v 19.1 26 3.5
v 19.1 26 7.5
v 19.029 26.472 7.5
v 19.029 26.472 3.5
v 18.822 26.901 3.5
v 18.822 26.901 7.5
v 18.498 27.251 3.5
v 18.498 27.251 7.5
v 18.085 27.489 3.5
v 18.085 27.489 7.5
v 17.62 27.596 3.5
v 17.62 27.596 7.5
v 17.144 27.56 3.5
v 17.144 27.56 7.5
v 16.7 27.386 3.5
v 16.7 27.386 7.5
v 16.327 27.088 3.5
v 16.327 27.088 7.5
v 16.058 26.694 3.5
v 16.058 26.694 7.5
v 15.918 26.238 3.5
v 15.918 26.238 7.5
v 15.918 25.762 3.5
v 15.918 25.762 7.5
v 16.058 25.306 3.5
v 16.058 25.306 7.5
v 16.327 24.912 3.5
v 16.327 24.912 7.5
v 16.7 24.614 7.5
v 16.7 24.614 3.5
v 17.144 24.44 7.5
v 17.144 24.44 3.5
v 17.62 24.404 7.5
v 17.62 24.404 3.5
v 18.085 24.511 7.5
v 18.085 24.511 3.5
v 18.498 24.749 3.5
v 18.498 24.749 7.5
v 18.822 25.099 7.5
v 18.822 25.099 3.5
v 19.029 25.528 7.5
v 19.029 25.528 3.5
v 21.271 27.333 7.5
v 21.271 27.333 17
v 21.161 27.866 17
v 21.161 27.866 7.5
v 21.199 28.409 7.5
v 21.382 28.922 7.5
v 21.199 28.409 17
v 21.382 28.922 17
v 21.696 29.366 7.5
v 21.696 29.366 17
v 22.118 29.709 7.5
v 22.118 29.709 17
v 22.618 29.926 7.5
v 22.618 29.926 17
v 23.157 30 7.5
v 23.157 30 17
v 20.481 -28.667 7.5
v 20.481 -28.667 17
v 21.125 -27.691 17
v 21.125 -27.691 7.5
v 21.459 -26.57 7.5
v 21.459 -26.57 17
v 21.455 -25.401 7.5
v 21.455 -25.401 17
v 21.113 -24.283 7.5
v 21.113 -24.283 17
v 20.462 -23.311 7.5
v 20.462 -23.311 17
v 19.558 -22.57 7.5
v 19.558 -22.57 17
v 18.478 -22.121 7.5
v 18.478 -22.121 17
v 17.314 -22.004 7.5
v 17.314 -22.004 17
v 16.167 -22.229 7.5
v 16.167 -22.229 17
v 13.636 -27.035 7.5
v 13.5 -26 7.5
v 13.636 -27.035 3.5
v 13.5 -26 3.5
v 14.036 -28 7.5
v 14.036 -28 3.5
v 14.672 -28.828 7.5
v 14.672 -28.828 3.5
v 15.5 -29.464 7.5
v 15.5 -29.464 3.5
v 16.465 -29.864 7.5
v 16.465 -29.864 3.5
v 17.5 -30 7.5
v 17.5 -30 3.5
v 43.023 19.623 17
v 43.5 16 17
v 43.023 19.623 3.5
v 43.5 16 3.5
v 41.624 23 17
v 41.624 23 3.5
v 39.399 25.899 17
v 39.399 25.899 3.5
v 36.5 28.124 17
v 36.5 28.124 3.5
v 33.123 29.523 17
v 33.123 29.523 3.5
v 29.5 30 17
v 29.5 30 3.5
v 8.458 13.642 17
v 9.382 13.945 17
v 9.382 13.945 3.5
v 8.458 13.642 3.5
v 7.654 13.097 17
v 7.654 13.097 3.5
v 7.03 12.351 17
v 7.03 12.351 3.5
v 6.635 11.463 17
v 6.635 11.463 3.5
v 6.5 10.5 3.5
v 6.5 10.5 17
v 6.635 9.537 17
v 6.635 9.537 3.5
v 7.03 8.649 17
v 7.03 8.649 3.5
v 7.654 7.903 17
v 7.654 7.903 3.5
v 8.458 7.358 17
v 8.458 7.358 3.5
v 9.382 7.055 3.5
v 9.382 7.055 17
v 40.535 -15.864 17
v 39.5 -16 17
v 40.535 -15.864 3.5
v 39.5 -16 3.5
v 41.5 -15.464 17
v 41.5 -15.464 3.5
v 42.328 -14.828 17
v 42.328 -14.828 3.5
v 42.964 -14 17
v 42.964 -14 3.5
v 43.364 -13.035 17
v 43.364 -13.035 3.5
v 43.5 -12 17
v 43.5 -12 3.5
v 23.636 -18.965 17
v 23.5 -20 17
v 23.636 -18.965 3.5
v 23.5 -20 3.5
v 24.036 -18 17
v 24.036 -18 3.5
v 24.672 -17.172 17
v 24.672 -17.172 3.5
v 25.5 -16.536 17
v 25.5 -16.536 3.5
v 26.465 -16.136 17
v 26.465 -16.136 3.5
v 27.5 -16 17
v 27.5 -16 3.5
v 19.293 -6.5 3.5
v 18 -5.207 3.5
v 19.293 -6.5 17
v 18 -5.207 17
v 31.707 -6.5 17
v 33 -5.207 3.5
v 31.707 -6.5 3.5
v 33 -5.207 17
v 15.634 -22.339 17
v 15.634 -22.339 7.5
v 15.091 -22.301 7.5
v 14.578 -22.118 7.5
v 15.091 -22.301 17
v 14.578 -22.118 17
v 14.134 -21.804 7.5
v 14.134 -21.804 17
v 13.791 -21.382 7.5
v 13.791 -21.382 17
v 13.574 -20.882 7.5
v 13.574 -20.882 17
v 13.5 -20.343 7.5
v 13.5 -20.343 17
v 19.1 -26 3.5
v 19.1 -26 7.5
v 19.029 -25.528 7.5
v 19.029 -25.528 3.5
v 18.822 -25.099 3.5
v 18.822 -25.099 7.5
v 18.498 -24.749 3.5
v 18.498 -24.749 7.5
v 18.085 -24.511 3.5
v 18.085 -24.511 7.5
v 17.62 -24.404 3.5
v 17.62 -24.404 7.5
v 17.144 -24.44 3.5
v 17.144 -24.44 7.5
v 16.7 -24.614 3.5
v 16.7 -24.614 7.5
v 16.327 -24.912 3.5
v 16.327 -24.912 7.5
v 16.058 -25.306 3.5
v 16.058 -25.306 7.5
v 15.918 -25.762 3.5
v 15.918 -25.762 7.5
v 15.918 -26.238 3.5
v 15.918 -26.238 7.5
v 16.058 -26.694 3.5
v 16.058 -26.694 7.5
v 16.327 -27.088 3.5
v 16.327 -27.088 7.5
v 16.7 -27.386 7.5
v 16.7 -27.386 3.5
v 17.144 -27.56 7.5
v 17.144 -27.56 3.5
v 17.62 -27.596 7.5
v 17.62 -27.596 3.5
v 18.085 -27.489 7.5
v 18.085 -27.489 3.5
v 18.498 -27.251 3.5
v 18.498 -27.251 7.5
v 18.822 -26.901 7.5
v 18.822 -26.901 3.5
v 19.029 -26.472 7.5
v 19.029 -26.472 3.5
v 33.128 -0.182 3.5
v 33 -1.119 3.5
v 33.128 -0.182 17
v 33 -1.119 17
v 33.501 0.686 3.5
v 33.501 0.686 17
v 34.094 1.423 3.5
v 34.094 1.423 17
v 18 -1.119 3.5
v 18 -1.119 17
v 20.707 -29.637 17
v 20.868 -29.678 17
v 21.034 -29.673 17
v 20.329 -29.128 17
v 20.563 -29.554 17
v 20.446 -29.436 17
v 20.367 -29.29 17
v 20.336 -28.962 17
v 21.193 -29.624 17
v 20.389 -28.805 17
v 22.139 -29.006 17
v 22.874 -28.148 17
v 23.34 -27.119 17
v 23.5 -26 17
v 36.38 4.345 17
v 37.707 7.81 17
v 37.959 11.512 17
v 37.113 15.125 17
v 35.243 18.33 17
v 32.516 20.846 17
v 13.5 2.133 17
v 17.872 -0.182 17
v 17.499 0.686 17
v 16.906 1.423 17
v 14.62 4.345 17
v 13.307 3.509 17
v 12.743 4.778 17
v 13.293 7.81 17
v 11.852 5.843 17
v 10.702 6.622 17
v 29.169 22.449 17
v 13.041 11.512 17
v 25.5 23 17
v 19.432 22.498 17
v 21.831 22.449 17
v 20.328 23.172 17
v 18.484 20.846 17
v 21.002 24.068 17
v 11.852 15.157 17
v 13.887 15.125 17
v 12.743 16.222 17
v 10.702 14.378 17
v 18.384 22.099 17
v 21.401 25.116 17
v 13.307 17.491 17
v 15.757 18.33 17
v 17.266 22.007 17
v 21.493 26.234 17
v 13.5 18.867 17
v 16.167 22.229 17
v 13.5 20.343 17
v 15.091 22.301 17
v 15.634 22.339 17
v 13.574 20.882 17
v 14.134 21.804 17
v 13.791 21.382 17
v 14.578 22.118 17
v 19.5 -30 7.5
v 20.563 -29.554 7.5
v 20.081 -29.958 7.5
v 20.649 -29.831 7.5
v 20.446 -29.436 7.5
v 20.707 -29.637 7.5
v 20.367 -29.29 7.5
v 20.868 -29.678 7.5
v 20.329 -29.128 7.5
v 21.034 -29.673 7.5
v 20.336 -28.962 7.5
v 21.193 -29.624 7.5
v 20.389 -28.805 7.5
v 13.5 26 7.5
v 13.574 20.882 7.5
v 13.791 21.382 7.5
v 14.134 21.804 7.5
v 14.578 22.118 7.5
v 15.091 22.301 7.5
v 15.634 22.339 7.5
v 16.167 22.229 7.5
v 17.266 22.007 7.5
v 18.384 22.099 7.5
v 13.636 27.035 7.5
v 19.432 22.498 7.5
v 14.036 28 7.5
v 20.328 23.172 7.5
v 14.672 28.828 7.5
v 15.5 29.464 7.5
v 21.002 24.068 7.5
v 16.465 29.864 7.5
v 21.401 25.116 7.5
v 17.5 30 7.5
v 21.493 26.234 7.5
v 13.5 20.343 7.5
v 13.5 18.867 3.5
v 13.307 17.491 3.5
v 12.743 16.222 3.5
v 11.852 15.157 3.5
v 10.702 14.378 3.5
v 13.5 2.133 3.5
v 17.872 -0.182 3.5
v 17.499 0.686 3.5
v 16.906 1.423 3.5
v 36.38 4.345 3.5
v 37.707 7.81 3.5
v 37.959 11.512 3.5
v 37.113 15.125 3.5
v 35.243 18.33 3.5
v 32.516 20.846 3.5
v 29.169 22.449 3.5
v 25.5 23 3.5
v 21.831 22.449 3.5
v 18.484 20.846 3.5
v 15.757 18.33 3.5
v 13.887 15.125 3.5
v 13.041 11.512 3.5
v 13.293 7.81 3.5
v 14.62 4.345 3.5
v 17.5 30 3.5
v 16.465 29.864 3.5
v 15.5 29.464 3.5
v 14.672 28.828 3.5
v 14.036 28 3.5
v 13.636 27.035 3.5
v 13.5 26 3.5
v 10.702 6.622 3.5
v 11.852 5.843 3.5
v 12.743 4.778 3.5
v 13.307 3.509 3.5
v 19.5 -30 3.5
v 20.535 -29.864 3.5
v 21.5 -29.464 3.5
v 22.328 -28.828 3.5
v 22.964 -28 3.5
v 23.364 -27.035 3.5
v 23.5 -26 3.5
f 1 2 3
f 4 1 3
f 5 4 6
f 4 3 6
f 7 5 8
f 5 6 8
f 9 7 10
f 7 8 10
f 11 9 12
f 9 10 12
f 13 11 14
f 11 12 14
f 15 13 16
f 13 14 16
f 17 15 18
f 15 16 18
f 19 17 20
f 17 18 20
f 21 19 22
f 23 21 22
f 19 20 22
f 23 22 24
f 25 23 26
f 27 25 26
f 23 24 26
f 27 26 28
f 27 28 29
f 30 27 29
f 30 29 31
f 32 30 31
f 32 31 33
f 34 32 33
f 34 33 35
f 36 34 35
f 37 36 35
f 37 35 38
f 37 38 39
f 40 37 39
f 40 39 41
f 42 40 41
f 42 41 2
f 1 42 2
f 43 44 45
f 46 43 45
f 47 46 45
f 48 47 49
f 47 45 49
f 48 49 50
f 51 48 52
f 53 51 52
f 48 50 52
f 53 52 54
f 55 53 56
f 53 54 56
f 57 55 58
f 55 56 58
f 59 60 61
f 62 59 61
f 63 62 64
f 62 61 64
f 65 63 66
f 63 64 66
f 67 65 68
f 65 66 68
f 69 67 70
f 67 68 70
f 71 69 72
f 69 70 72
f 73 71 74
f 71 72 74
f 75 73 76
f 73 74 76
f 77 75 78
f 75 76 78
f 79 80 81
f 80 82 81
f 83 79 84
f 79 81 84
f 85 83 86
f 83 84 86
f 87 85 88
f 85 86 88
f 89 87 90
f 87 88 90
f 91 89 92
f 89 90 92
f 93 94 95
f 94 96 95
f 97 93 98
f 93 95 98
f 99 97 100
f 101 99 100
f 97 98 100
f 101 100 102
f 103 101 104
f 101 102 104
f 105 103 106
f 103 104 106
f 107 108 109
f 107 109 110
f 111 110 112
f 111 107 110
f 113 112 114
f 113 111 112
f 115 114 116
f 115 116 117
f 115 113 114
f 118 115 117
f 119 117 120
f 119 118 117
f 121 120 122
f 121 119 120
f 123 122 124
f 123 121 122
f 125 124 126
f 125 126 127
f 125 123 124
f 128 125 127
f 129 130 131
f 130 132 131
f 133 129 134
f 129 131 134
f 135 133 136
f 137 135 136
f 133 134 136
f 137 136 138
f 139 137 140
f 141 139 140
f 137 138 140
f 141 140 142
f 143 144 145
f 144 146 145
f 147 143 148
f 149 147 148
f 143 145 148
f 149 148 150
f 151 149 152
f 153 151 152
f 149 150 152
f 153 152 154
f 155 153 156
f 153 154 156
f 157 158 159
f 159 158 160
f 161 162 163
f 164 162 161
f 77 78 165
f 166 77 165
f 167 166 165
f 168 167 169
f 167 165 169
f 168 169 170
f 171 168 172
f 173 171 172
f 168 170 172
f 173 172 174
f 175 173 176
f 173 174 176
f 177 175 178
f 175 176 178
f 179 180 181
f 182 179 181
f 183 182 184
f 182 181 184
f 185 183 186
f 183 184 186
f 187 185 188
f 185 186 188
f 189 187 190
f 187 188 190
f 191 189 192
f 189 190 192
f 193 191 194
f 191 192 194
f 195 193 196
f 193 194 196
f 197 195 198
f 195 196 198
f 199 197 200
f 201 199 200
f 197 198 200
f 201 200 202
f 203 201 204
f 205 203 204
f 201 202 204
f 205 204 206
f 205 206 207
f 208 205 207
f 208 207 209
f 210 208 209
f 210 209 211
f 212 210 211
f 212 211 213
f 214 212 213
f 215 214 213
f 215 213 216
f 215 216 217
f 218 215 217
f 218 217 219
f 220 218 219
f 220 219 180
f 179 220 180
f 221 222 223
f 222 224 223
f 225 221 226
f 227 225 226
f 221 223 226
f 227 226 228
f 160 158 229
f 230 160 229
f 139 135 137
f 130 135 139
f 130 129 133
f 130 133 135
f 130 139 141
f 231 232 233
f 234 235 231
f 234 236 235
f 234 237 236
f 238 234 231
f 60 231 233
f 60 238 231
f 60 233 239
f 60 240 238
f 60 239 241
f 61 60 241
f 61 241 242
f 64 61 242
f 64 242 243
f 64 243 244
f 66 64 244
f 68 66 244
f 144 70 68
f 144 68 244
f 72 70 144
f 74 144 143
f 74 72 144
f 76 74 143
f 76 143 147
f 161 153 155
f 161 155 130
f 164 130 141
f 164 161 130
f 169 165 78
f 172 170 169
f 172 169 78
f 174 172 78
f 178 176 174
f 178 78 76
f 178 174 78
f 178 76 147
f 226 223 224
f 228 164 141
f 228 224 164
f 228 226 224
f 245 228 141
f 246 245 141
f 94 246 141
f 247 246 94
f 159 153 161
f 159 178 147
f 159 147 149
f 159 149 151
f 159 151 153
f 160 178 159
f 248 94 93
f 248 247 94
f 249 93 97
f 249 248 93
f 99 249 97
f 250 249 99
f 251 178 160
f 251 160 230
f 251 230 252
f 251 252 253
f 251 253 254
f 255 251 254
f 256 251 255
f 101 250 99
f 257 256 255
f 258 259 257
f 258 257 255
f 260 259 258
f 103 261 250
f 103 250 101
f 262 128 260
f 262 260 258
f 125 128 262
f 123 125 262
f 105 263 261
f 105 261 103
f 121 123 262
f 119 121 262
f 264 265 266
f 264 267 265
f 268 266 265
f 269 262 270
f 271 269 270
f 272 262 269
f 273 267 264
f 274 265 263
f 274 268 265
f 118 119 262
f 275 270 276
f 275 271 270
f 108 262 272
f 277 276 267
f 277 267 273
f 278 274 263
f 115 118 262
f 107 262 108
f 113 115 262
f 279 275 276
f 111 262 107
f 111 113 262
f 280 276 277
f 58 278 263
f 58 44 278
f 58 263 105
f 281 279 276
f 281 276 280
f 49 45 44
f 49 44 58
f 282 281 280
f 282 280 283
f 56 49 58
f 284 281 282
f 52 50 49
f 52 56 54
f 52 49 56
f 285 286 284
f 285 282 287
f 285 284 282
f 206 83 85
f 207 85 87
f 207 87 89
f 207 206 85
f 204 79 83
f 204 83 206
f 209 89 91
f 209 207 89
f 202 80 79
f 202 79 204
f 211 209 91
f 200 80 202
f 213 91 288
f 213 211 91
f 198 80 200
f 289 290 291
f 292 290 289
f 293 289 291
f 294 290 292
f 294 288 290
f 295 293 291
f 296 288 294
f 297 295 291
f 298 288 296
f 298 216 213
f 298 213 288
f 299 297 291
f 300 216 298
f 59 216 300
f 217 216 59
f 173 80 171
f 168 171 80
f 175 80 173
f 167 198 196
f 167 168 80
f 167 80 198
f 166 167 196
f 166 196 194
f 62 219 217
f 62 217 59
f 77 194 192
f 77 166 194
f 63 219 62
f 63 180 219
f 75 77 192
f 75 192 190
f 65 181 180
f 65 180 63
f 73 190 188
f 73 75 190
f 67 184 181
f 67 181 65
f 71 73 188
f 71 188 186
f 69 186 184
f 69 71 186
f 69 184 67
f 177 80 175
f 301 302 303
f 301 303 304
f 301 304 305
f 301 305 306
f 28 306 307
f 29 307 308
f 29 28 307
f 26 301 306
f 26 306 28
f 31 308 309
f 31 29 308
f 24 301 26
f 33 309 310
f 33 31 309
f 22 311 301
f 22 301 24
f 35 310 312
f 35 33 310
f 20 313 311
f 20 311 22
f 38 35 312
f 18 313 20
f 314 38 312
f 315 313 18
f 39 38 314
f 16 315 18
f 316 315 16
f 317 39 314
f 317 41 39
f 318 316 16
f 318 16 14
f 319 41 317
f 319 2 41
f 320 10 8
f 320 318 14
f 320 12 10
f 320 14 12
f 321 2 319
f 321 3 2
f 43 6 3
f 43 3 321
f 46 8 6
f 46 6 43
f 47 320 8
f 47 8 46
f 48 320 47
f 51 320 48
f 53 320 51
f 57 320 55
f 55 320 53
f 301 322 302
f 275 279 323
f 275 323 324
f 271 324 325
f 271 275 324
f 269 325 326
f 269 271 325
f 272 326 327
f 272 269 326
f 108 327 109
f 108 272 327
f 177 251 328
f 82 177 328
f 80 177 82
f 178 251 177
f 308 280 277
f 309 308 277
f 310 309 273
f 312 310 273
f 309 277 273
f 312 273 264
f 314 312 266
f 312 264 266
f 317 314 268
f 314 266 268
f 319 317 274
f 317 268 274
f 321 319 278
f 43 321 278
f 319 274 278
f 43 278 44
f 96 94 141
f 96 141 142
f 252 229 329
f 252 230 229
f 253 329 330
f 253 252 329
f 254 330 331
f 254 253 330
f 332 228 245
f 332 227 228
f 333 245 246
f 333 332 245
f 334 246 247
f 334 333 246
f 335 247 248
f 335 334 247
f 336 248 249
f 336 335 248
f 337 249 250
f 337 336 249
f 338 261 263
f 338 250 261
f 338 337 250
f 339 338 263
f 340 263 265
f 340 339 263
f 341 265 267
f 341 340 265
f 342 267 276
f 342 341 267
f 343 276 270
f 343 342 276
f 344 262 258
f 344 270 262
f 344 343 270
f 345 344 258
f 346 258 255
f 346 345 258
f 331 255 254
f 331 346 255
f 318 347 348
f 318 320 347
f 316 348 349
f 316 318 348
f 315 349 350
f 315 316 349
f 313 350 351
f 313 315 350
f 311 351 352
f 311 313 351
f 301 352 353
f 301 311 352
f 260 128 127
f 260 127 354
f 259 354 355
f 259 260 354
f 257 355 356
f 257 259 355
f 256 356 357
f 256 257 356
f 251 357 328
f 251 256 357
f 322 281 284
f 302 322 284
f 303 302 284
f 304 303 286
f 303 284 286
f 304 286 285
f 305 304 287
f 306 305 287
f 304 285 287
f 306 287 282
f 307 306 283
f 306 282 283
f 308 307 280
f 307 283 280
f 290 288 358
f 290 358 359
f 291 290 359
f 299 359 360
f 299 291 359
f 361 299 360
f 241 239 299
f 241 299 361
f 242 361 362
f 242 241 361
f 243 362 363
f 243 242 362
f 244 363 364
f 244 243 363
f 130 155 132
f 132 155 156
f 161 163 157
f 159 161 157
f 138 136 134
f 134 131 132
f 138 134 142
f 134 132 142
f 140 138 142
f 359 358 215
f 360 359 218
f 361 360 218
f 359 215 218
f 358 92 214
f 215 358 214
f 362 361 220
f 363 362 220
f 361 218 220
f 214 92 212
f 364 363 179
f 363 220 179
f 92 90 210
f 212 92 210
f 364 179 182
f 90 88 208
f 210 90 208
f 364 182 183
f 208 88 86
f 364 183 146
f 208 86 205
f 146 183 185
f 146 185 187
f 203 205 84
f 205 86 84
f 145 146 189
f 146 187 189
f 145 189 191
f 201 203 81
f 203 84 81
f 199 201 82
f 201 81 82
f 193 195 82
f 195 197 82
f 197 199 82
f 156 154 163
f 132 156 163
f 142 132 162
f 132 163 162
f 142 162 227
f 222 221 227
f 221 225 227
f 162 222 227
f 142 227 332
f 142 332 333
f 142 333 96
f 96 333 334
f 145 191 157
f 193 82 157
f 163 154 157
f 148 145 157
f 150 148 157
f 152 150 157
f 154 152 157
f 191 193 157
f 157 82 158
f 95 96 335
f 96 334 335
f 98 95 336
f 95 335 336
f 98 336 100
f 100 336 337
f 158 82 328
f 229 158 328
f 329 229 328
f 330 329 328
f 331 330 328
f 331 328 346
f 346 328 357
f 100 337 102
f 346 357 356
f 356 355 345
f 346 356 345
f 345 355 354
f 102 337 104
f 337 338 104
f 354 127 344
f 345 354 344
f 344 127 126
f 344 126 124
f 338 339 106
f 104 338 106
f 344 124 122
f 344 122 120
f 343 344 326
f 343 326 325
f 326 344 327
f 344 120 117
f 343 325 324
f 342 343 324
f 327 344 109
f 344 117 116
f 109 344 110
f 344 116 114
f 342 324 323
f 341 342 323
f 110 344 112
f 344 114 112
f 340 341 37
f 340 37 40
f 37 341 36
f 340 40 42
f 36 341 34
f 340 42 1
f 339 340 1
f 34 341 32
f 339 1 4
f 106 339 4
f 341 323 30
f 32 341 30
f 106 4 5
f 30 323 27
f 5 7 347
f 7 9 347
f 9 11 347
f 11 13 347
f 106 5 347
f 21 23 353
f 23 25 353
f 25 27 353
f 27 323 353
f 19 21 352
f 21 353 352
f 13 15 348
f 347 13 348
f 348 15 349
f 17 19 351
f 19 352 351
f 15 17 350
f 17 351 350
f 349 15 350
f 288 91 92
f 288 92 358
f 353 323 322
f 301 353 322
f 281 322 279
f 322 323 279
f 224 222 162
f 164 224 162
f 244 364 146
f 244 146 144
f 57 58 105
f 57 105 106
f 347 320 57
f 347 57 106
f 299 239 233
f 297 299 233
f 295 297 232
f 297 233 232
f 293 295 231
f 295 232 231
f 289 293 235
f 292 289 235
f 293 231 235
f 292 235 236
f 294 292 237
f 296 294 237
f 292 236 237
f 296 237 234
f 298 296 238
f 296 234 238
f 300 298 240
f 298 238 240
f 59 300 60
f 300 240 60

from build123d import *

# Parameters (mm, degrees)
EXTRUDE_1_DEPTH             = 13.5
CUT_EXTRUDE_1_DEPTH         = 9.5
SKETCH_3_W                  = 10
SKETCH_3_H                  = 13.5
EXTRUDE_2_DEPTH             = 11.133399735
SKETCH_4_W                  = 13.5
SKETCH_4_H                  = 46
EXTRUDE_3_DEPTH             = 20
CUT_EXTRUDE_2_DEPTH         = 9.5
CUT_EXTRUDE_3_DEPTH         = 55.538976888
SKETCH_7_W                  = 12.5
SKETCH_7_H                  = 13.5
HOLE_WIZARD_3_2_3_2_1_D     = 3.2
HOLE_WIZARD_3_2_3_2_1_DEPTH = 13.5
CHAMFER_1_SIZE              = 1.292893219
FILLET_1_R                  = 3.5
FILLET_2_R                  = 4
FILLET_3_R                  = 14


with BuildPart() as part:
    # 草图1 → 凸台-拉伸1 (new body)
    with BuildSketch(Plane.XY.offset(17)):
        with BuildLine():
            Line((13.5, -30), (19.5, -30))
            ThreePointArc((19.5, -30), (22.328427125, -28.828427125), (23.5, -26))
            Line((23.5, -26), (23.5, 18.866600265))
            Line((23.5, 18.866600265), (13.5, 18.866600265))
            ThreePointArc((13.5, 18.866600265), (12.334824944, 15.658155526), (9.382352941, 13.945070697))
            ThreePointArc((9.382352941, 13.945070697), (6.5, 10.5), (9.382352941, 7.054929303))
            ThreePointArc((9.382352941, 7.054929303), (12.334824944, 5.341844474), (13.5, 2.133399735))
            Line((13.5, 2.133399735), (13.5, -30))
        make_face()
    extrude(amount=-EXTRUDE_1_DEPTH)

    # 草图2 → 切除-拉伸1 (cut)
    with BuildSketch(Plane.XY.offset(17)):
        with BuildLine():
            Line((13.5, -20.343145751), (13.5, -30))
            Line((13.5, -30), (19.5, -30))
            ThreePointArc((19.5, -30), (20.366987609, -29.904911329), (21.192754868, -29.624166243))
            ThreePointArc((21.192754868, -29.624166243), (20.446463344, -29.435660891), (20.481374199, -28.666722312))
            ThreePointArc((20.481374199, -28.666722312), (20.822775499, -23.773082178), (16.166666667, -22.228763834))
            ThreePointArc((16.166666667, -22.228763834), (14.345299462, -21.976138912), (13.5, -20.343145751))
        make_face()
    extrude(amount=-CUT_EXTRUDE_1_DEPTH, mode=Mode.SUBTRACT)

    # 草图3 → 凸台-拉伸2 (add)
    with BuildSketch(Plane(origin=(0, 18.866600265, 0), x_dir=(-1, 0, 0), z_dir=(0, 1, 0))):
        with Locations((-18.5, 10.25)):
            Rectangle(SKETCH_3_W, SKETCH_3_H)
    extrude(amount=EXTRUDE_2_DEPTH)

    # 草图4 → 凸台-拉伸3 (add)
    with BuildSketch(Plane(origin=(23.5, 0, 0), x_dir=(0, 0, -1), z_dir=(1, 0, 0))):
        with Locations((-10.25, 7)):
            Rectangle(SKETCH_4_W, SKETCH_4_H)
    extrude(amount=EXTRUDE_3_DEPTH)

    # 草图5 → 切除-拉伸2 (cut)
    with BuildSketch(Plane.XY.offset(17)):
        with BuildLine():
            Line((23.156854249, 30), (13.5, 30))
            Line((13.5, 30), (13.5, 20.343145751))
            ThreePointArc((13.5, 20.343145751), (14.345299462, 21.976138912), (16.166666667, 22.228763834))
            ThreePointArc((16.166666667, 22.228763834), (20.328427125, 23.171572875), (21.271236166, 27.333333333))
            ThreePointArc((21.271236166, 27.333333333), (21.523861088, 29.154700538), (23.156854249, 30))
        make_face()
    extrude(amount=-CUT_EXTRUDE_2_DEPTH, mode=Mode.SUBTRACT)

    # 草图6 → 切除-拉伸3 (cut, through all)
    with BuildSketch(Plane(origin=(0, 0, 3.5), x_dir=(-1, 0, 0), z_dir=(0, 0, -1))):
        with BuildLine():
            Line((-33, -6.5), (-18, -6.5))
            Line((-18, -6.5), (-18, 0.5))
            ThreePointArc((-18, 0.5), (-25.5, -2), (-33, 0.5))
            Line((-33, 0.5), (-33, -6.5))
        make_face()
    extrude(amount=-CUT_EXTRUDE_3_DEPTH, mode=Mode.SUBTRACT)

    # 草图7 → 切除-旋转1 (revolve, cut)
    with BuildSketch(Plane(origin=(0, 10.5, 0), x_dir=(1, 0, 0), z_dir=(0, 1, 0))):
        with Locations((31.75, -10.25)):
            Rectangle(SKETCH_7_W, SKETCH_7_H)
    revolve(axis=Axis((25.5, 10.5, 3.5), (0, 0, 1)), mode=Mode.SUBTRACT)

    # Ø3.2 (3.2) 直径孔1
    with Locations(Plane(origin=(0, 0, 3.5), x_dir=(-1, 0, 0), z_dir=(0, 0, -1))):
        with Locations((-17.5, 26), (-17.5, -26)):
            Hole(HOLE_WIZARD_3_2_3_2_1_D / 2, depth=HOLE_WIZARD_3_2_3_2_1_DEPTH)

    # 倒角1
    chamfer_1_edges = [part.edges().sort_by_distance(p)[0] for p in [
        (33, -6.5, 10.25),
        (18, -6.5, 10.25),
    ]]
    chamfer(chamfer_1_edges, length=CHAMFER_1_SIZE)

    # 圆角1
    fillet_1_edges = [part.edges().sort_by_distance(p)[0] for p in [
        (33, 0.5, 10.25),
        (18, 0.5, 10.25),
    ]]
    fillet(fillet_1_edges, radius=FILLET_1_R)

    # 圆角2
    fillet_2_edges = [part.edges().sort_by_distance(p)[0] for p in [
        (13.5, -30, 5.5),
        (13.5, 30, 5.5),
        (23.5, -16, 10.25),
        (43.5, -16, 10.25),
    ]]
    fillet(fillet_2_edges, radius=FILLET_2_R)

    # 圆角3
    fillet_3_edges = [part.edges().sort_by_distance(p)[0] for p in [
        (43.5, 30, 10.25),
    ]]
    fillet(fillet_3_edges, radius=FILLET_3_R)


solid = part.part
